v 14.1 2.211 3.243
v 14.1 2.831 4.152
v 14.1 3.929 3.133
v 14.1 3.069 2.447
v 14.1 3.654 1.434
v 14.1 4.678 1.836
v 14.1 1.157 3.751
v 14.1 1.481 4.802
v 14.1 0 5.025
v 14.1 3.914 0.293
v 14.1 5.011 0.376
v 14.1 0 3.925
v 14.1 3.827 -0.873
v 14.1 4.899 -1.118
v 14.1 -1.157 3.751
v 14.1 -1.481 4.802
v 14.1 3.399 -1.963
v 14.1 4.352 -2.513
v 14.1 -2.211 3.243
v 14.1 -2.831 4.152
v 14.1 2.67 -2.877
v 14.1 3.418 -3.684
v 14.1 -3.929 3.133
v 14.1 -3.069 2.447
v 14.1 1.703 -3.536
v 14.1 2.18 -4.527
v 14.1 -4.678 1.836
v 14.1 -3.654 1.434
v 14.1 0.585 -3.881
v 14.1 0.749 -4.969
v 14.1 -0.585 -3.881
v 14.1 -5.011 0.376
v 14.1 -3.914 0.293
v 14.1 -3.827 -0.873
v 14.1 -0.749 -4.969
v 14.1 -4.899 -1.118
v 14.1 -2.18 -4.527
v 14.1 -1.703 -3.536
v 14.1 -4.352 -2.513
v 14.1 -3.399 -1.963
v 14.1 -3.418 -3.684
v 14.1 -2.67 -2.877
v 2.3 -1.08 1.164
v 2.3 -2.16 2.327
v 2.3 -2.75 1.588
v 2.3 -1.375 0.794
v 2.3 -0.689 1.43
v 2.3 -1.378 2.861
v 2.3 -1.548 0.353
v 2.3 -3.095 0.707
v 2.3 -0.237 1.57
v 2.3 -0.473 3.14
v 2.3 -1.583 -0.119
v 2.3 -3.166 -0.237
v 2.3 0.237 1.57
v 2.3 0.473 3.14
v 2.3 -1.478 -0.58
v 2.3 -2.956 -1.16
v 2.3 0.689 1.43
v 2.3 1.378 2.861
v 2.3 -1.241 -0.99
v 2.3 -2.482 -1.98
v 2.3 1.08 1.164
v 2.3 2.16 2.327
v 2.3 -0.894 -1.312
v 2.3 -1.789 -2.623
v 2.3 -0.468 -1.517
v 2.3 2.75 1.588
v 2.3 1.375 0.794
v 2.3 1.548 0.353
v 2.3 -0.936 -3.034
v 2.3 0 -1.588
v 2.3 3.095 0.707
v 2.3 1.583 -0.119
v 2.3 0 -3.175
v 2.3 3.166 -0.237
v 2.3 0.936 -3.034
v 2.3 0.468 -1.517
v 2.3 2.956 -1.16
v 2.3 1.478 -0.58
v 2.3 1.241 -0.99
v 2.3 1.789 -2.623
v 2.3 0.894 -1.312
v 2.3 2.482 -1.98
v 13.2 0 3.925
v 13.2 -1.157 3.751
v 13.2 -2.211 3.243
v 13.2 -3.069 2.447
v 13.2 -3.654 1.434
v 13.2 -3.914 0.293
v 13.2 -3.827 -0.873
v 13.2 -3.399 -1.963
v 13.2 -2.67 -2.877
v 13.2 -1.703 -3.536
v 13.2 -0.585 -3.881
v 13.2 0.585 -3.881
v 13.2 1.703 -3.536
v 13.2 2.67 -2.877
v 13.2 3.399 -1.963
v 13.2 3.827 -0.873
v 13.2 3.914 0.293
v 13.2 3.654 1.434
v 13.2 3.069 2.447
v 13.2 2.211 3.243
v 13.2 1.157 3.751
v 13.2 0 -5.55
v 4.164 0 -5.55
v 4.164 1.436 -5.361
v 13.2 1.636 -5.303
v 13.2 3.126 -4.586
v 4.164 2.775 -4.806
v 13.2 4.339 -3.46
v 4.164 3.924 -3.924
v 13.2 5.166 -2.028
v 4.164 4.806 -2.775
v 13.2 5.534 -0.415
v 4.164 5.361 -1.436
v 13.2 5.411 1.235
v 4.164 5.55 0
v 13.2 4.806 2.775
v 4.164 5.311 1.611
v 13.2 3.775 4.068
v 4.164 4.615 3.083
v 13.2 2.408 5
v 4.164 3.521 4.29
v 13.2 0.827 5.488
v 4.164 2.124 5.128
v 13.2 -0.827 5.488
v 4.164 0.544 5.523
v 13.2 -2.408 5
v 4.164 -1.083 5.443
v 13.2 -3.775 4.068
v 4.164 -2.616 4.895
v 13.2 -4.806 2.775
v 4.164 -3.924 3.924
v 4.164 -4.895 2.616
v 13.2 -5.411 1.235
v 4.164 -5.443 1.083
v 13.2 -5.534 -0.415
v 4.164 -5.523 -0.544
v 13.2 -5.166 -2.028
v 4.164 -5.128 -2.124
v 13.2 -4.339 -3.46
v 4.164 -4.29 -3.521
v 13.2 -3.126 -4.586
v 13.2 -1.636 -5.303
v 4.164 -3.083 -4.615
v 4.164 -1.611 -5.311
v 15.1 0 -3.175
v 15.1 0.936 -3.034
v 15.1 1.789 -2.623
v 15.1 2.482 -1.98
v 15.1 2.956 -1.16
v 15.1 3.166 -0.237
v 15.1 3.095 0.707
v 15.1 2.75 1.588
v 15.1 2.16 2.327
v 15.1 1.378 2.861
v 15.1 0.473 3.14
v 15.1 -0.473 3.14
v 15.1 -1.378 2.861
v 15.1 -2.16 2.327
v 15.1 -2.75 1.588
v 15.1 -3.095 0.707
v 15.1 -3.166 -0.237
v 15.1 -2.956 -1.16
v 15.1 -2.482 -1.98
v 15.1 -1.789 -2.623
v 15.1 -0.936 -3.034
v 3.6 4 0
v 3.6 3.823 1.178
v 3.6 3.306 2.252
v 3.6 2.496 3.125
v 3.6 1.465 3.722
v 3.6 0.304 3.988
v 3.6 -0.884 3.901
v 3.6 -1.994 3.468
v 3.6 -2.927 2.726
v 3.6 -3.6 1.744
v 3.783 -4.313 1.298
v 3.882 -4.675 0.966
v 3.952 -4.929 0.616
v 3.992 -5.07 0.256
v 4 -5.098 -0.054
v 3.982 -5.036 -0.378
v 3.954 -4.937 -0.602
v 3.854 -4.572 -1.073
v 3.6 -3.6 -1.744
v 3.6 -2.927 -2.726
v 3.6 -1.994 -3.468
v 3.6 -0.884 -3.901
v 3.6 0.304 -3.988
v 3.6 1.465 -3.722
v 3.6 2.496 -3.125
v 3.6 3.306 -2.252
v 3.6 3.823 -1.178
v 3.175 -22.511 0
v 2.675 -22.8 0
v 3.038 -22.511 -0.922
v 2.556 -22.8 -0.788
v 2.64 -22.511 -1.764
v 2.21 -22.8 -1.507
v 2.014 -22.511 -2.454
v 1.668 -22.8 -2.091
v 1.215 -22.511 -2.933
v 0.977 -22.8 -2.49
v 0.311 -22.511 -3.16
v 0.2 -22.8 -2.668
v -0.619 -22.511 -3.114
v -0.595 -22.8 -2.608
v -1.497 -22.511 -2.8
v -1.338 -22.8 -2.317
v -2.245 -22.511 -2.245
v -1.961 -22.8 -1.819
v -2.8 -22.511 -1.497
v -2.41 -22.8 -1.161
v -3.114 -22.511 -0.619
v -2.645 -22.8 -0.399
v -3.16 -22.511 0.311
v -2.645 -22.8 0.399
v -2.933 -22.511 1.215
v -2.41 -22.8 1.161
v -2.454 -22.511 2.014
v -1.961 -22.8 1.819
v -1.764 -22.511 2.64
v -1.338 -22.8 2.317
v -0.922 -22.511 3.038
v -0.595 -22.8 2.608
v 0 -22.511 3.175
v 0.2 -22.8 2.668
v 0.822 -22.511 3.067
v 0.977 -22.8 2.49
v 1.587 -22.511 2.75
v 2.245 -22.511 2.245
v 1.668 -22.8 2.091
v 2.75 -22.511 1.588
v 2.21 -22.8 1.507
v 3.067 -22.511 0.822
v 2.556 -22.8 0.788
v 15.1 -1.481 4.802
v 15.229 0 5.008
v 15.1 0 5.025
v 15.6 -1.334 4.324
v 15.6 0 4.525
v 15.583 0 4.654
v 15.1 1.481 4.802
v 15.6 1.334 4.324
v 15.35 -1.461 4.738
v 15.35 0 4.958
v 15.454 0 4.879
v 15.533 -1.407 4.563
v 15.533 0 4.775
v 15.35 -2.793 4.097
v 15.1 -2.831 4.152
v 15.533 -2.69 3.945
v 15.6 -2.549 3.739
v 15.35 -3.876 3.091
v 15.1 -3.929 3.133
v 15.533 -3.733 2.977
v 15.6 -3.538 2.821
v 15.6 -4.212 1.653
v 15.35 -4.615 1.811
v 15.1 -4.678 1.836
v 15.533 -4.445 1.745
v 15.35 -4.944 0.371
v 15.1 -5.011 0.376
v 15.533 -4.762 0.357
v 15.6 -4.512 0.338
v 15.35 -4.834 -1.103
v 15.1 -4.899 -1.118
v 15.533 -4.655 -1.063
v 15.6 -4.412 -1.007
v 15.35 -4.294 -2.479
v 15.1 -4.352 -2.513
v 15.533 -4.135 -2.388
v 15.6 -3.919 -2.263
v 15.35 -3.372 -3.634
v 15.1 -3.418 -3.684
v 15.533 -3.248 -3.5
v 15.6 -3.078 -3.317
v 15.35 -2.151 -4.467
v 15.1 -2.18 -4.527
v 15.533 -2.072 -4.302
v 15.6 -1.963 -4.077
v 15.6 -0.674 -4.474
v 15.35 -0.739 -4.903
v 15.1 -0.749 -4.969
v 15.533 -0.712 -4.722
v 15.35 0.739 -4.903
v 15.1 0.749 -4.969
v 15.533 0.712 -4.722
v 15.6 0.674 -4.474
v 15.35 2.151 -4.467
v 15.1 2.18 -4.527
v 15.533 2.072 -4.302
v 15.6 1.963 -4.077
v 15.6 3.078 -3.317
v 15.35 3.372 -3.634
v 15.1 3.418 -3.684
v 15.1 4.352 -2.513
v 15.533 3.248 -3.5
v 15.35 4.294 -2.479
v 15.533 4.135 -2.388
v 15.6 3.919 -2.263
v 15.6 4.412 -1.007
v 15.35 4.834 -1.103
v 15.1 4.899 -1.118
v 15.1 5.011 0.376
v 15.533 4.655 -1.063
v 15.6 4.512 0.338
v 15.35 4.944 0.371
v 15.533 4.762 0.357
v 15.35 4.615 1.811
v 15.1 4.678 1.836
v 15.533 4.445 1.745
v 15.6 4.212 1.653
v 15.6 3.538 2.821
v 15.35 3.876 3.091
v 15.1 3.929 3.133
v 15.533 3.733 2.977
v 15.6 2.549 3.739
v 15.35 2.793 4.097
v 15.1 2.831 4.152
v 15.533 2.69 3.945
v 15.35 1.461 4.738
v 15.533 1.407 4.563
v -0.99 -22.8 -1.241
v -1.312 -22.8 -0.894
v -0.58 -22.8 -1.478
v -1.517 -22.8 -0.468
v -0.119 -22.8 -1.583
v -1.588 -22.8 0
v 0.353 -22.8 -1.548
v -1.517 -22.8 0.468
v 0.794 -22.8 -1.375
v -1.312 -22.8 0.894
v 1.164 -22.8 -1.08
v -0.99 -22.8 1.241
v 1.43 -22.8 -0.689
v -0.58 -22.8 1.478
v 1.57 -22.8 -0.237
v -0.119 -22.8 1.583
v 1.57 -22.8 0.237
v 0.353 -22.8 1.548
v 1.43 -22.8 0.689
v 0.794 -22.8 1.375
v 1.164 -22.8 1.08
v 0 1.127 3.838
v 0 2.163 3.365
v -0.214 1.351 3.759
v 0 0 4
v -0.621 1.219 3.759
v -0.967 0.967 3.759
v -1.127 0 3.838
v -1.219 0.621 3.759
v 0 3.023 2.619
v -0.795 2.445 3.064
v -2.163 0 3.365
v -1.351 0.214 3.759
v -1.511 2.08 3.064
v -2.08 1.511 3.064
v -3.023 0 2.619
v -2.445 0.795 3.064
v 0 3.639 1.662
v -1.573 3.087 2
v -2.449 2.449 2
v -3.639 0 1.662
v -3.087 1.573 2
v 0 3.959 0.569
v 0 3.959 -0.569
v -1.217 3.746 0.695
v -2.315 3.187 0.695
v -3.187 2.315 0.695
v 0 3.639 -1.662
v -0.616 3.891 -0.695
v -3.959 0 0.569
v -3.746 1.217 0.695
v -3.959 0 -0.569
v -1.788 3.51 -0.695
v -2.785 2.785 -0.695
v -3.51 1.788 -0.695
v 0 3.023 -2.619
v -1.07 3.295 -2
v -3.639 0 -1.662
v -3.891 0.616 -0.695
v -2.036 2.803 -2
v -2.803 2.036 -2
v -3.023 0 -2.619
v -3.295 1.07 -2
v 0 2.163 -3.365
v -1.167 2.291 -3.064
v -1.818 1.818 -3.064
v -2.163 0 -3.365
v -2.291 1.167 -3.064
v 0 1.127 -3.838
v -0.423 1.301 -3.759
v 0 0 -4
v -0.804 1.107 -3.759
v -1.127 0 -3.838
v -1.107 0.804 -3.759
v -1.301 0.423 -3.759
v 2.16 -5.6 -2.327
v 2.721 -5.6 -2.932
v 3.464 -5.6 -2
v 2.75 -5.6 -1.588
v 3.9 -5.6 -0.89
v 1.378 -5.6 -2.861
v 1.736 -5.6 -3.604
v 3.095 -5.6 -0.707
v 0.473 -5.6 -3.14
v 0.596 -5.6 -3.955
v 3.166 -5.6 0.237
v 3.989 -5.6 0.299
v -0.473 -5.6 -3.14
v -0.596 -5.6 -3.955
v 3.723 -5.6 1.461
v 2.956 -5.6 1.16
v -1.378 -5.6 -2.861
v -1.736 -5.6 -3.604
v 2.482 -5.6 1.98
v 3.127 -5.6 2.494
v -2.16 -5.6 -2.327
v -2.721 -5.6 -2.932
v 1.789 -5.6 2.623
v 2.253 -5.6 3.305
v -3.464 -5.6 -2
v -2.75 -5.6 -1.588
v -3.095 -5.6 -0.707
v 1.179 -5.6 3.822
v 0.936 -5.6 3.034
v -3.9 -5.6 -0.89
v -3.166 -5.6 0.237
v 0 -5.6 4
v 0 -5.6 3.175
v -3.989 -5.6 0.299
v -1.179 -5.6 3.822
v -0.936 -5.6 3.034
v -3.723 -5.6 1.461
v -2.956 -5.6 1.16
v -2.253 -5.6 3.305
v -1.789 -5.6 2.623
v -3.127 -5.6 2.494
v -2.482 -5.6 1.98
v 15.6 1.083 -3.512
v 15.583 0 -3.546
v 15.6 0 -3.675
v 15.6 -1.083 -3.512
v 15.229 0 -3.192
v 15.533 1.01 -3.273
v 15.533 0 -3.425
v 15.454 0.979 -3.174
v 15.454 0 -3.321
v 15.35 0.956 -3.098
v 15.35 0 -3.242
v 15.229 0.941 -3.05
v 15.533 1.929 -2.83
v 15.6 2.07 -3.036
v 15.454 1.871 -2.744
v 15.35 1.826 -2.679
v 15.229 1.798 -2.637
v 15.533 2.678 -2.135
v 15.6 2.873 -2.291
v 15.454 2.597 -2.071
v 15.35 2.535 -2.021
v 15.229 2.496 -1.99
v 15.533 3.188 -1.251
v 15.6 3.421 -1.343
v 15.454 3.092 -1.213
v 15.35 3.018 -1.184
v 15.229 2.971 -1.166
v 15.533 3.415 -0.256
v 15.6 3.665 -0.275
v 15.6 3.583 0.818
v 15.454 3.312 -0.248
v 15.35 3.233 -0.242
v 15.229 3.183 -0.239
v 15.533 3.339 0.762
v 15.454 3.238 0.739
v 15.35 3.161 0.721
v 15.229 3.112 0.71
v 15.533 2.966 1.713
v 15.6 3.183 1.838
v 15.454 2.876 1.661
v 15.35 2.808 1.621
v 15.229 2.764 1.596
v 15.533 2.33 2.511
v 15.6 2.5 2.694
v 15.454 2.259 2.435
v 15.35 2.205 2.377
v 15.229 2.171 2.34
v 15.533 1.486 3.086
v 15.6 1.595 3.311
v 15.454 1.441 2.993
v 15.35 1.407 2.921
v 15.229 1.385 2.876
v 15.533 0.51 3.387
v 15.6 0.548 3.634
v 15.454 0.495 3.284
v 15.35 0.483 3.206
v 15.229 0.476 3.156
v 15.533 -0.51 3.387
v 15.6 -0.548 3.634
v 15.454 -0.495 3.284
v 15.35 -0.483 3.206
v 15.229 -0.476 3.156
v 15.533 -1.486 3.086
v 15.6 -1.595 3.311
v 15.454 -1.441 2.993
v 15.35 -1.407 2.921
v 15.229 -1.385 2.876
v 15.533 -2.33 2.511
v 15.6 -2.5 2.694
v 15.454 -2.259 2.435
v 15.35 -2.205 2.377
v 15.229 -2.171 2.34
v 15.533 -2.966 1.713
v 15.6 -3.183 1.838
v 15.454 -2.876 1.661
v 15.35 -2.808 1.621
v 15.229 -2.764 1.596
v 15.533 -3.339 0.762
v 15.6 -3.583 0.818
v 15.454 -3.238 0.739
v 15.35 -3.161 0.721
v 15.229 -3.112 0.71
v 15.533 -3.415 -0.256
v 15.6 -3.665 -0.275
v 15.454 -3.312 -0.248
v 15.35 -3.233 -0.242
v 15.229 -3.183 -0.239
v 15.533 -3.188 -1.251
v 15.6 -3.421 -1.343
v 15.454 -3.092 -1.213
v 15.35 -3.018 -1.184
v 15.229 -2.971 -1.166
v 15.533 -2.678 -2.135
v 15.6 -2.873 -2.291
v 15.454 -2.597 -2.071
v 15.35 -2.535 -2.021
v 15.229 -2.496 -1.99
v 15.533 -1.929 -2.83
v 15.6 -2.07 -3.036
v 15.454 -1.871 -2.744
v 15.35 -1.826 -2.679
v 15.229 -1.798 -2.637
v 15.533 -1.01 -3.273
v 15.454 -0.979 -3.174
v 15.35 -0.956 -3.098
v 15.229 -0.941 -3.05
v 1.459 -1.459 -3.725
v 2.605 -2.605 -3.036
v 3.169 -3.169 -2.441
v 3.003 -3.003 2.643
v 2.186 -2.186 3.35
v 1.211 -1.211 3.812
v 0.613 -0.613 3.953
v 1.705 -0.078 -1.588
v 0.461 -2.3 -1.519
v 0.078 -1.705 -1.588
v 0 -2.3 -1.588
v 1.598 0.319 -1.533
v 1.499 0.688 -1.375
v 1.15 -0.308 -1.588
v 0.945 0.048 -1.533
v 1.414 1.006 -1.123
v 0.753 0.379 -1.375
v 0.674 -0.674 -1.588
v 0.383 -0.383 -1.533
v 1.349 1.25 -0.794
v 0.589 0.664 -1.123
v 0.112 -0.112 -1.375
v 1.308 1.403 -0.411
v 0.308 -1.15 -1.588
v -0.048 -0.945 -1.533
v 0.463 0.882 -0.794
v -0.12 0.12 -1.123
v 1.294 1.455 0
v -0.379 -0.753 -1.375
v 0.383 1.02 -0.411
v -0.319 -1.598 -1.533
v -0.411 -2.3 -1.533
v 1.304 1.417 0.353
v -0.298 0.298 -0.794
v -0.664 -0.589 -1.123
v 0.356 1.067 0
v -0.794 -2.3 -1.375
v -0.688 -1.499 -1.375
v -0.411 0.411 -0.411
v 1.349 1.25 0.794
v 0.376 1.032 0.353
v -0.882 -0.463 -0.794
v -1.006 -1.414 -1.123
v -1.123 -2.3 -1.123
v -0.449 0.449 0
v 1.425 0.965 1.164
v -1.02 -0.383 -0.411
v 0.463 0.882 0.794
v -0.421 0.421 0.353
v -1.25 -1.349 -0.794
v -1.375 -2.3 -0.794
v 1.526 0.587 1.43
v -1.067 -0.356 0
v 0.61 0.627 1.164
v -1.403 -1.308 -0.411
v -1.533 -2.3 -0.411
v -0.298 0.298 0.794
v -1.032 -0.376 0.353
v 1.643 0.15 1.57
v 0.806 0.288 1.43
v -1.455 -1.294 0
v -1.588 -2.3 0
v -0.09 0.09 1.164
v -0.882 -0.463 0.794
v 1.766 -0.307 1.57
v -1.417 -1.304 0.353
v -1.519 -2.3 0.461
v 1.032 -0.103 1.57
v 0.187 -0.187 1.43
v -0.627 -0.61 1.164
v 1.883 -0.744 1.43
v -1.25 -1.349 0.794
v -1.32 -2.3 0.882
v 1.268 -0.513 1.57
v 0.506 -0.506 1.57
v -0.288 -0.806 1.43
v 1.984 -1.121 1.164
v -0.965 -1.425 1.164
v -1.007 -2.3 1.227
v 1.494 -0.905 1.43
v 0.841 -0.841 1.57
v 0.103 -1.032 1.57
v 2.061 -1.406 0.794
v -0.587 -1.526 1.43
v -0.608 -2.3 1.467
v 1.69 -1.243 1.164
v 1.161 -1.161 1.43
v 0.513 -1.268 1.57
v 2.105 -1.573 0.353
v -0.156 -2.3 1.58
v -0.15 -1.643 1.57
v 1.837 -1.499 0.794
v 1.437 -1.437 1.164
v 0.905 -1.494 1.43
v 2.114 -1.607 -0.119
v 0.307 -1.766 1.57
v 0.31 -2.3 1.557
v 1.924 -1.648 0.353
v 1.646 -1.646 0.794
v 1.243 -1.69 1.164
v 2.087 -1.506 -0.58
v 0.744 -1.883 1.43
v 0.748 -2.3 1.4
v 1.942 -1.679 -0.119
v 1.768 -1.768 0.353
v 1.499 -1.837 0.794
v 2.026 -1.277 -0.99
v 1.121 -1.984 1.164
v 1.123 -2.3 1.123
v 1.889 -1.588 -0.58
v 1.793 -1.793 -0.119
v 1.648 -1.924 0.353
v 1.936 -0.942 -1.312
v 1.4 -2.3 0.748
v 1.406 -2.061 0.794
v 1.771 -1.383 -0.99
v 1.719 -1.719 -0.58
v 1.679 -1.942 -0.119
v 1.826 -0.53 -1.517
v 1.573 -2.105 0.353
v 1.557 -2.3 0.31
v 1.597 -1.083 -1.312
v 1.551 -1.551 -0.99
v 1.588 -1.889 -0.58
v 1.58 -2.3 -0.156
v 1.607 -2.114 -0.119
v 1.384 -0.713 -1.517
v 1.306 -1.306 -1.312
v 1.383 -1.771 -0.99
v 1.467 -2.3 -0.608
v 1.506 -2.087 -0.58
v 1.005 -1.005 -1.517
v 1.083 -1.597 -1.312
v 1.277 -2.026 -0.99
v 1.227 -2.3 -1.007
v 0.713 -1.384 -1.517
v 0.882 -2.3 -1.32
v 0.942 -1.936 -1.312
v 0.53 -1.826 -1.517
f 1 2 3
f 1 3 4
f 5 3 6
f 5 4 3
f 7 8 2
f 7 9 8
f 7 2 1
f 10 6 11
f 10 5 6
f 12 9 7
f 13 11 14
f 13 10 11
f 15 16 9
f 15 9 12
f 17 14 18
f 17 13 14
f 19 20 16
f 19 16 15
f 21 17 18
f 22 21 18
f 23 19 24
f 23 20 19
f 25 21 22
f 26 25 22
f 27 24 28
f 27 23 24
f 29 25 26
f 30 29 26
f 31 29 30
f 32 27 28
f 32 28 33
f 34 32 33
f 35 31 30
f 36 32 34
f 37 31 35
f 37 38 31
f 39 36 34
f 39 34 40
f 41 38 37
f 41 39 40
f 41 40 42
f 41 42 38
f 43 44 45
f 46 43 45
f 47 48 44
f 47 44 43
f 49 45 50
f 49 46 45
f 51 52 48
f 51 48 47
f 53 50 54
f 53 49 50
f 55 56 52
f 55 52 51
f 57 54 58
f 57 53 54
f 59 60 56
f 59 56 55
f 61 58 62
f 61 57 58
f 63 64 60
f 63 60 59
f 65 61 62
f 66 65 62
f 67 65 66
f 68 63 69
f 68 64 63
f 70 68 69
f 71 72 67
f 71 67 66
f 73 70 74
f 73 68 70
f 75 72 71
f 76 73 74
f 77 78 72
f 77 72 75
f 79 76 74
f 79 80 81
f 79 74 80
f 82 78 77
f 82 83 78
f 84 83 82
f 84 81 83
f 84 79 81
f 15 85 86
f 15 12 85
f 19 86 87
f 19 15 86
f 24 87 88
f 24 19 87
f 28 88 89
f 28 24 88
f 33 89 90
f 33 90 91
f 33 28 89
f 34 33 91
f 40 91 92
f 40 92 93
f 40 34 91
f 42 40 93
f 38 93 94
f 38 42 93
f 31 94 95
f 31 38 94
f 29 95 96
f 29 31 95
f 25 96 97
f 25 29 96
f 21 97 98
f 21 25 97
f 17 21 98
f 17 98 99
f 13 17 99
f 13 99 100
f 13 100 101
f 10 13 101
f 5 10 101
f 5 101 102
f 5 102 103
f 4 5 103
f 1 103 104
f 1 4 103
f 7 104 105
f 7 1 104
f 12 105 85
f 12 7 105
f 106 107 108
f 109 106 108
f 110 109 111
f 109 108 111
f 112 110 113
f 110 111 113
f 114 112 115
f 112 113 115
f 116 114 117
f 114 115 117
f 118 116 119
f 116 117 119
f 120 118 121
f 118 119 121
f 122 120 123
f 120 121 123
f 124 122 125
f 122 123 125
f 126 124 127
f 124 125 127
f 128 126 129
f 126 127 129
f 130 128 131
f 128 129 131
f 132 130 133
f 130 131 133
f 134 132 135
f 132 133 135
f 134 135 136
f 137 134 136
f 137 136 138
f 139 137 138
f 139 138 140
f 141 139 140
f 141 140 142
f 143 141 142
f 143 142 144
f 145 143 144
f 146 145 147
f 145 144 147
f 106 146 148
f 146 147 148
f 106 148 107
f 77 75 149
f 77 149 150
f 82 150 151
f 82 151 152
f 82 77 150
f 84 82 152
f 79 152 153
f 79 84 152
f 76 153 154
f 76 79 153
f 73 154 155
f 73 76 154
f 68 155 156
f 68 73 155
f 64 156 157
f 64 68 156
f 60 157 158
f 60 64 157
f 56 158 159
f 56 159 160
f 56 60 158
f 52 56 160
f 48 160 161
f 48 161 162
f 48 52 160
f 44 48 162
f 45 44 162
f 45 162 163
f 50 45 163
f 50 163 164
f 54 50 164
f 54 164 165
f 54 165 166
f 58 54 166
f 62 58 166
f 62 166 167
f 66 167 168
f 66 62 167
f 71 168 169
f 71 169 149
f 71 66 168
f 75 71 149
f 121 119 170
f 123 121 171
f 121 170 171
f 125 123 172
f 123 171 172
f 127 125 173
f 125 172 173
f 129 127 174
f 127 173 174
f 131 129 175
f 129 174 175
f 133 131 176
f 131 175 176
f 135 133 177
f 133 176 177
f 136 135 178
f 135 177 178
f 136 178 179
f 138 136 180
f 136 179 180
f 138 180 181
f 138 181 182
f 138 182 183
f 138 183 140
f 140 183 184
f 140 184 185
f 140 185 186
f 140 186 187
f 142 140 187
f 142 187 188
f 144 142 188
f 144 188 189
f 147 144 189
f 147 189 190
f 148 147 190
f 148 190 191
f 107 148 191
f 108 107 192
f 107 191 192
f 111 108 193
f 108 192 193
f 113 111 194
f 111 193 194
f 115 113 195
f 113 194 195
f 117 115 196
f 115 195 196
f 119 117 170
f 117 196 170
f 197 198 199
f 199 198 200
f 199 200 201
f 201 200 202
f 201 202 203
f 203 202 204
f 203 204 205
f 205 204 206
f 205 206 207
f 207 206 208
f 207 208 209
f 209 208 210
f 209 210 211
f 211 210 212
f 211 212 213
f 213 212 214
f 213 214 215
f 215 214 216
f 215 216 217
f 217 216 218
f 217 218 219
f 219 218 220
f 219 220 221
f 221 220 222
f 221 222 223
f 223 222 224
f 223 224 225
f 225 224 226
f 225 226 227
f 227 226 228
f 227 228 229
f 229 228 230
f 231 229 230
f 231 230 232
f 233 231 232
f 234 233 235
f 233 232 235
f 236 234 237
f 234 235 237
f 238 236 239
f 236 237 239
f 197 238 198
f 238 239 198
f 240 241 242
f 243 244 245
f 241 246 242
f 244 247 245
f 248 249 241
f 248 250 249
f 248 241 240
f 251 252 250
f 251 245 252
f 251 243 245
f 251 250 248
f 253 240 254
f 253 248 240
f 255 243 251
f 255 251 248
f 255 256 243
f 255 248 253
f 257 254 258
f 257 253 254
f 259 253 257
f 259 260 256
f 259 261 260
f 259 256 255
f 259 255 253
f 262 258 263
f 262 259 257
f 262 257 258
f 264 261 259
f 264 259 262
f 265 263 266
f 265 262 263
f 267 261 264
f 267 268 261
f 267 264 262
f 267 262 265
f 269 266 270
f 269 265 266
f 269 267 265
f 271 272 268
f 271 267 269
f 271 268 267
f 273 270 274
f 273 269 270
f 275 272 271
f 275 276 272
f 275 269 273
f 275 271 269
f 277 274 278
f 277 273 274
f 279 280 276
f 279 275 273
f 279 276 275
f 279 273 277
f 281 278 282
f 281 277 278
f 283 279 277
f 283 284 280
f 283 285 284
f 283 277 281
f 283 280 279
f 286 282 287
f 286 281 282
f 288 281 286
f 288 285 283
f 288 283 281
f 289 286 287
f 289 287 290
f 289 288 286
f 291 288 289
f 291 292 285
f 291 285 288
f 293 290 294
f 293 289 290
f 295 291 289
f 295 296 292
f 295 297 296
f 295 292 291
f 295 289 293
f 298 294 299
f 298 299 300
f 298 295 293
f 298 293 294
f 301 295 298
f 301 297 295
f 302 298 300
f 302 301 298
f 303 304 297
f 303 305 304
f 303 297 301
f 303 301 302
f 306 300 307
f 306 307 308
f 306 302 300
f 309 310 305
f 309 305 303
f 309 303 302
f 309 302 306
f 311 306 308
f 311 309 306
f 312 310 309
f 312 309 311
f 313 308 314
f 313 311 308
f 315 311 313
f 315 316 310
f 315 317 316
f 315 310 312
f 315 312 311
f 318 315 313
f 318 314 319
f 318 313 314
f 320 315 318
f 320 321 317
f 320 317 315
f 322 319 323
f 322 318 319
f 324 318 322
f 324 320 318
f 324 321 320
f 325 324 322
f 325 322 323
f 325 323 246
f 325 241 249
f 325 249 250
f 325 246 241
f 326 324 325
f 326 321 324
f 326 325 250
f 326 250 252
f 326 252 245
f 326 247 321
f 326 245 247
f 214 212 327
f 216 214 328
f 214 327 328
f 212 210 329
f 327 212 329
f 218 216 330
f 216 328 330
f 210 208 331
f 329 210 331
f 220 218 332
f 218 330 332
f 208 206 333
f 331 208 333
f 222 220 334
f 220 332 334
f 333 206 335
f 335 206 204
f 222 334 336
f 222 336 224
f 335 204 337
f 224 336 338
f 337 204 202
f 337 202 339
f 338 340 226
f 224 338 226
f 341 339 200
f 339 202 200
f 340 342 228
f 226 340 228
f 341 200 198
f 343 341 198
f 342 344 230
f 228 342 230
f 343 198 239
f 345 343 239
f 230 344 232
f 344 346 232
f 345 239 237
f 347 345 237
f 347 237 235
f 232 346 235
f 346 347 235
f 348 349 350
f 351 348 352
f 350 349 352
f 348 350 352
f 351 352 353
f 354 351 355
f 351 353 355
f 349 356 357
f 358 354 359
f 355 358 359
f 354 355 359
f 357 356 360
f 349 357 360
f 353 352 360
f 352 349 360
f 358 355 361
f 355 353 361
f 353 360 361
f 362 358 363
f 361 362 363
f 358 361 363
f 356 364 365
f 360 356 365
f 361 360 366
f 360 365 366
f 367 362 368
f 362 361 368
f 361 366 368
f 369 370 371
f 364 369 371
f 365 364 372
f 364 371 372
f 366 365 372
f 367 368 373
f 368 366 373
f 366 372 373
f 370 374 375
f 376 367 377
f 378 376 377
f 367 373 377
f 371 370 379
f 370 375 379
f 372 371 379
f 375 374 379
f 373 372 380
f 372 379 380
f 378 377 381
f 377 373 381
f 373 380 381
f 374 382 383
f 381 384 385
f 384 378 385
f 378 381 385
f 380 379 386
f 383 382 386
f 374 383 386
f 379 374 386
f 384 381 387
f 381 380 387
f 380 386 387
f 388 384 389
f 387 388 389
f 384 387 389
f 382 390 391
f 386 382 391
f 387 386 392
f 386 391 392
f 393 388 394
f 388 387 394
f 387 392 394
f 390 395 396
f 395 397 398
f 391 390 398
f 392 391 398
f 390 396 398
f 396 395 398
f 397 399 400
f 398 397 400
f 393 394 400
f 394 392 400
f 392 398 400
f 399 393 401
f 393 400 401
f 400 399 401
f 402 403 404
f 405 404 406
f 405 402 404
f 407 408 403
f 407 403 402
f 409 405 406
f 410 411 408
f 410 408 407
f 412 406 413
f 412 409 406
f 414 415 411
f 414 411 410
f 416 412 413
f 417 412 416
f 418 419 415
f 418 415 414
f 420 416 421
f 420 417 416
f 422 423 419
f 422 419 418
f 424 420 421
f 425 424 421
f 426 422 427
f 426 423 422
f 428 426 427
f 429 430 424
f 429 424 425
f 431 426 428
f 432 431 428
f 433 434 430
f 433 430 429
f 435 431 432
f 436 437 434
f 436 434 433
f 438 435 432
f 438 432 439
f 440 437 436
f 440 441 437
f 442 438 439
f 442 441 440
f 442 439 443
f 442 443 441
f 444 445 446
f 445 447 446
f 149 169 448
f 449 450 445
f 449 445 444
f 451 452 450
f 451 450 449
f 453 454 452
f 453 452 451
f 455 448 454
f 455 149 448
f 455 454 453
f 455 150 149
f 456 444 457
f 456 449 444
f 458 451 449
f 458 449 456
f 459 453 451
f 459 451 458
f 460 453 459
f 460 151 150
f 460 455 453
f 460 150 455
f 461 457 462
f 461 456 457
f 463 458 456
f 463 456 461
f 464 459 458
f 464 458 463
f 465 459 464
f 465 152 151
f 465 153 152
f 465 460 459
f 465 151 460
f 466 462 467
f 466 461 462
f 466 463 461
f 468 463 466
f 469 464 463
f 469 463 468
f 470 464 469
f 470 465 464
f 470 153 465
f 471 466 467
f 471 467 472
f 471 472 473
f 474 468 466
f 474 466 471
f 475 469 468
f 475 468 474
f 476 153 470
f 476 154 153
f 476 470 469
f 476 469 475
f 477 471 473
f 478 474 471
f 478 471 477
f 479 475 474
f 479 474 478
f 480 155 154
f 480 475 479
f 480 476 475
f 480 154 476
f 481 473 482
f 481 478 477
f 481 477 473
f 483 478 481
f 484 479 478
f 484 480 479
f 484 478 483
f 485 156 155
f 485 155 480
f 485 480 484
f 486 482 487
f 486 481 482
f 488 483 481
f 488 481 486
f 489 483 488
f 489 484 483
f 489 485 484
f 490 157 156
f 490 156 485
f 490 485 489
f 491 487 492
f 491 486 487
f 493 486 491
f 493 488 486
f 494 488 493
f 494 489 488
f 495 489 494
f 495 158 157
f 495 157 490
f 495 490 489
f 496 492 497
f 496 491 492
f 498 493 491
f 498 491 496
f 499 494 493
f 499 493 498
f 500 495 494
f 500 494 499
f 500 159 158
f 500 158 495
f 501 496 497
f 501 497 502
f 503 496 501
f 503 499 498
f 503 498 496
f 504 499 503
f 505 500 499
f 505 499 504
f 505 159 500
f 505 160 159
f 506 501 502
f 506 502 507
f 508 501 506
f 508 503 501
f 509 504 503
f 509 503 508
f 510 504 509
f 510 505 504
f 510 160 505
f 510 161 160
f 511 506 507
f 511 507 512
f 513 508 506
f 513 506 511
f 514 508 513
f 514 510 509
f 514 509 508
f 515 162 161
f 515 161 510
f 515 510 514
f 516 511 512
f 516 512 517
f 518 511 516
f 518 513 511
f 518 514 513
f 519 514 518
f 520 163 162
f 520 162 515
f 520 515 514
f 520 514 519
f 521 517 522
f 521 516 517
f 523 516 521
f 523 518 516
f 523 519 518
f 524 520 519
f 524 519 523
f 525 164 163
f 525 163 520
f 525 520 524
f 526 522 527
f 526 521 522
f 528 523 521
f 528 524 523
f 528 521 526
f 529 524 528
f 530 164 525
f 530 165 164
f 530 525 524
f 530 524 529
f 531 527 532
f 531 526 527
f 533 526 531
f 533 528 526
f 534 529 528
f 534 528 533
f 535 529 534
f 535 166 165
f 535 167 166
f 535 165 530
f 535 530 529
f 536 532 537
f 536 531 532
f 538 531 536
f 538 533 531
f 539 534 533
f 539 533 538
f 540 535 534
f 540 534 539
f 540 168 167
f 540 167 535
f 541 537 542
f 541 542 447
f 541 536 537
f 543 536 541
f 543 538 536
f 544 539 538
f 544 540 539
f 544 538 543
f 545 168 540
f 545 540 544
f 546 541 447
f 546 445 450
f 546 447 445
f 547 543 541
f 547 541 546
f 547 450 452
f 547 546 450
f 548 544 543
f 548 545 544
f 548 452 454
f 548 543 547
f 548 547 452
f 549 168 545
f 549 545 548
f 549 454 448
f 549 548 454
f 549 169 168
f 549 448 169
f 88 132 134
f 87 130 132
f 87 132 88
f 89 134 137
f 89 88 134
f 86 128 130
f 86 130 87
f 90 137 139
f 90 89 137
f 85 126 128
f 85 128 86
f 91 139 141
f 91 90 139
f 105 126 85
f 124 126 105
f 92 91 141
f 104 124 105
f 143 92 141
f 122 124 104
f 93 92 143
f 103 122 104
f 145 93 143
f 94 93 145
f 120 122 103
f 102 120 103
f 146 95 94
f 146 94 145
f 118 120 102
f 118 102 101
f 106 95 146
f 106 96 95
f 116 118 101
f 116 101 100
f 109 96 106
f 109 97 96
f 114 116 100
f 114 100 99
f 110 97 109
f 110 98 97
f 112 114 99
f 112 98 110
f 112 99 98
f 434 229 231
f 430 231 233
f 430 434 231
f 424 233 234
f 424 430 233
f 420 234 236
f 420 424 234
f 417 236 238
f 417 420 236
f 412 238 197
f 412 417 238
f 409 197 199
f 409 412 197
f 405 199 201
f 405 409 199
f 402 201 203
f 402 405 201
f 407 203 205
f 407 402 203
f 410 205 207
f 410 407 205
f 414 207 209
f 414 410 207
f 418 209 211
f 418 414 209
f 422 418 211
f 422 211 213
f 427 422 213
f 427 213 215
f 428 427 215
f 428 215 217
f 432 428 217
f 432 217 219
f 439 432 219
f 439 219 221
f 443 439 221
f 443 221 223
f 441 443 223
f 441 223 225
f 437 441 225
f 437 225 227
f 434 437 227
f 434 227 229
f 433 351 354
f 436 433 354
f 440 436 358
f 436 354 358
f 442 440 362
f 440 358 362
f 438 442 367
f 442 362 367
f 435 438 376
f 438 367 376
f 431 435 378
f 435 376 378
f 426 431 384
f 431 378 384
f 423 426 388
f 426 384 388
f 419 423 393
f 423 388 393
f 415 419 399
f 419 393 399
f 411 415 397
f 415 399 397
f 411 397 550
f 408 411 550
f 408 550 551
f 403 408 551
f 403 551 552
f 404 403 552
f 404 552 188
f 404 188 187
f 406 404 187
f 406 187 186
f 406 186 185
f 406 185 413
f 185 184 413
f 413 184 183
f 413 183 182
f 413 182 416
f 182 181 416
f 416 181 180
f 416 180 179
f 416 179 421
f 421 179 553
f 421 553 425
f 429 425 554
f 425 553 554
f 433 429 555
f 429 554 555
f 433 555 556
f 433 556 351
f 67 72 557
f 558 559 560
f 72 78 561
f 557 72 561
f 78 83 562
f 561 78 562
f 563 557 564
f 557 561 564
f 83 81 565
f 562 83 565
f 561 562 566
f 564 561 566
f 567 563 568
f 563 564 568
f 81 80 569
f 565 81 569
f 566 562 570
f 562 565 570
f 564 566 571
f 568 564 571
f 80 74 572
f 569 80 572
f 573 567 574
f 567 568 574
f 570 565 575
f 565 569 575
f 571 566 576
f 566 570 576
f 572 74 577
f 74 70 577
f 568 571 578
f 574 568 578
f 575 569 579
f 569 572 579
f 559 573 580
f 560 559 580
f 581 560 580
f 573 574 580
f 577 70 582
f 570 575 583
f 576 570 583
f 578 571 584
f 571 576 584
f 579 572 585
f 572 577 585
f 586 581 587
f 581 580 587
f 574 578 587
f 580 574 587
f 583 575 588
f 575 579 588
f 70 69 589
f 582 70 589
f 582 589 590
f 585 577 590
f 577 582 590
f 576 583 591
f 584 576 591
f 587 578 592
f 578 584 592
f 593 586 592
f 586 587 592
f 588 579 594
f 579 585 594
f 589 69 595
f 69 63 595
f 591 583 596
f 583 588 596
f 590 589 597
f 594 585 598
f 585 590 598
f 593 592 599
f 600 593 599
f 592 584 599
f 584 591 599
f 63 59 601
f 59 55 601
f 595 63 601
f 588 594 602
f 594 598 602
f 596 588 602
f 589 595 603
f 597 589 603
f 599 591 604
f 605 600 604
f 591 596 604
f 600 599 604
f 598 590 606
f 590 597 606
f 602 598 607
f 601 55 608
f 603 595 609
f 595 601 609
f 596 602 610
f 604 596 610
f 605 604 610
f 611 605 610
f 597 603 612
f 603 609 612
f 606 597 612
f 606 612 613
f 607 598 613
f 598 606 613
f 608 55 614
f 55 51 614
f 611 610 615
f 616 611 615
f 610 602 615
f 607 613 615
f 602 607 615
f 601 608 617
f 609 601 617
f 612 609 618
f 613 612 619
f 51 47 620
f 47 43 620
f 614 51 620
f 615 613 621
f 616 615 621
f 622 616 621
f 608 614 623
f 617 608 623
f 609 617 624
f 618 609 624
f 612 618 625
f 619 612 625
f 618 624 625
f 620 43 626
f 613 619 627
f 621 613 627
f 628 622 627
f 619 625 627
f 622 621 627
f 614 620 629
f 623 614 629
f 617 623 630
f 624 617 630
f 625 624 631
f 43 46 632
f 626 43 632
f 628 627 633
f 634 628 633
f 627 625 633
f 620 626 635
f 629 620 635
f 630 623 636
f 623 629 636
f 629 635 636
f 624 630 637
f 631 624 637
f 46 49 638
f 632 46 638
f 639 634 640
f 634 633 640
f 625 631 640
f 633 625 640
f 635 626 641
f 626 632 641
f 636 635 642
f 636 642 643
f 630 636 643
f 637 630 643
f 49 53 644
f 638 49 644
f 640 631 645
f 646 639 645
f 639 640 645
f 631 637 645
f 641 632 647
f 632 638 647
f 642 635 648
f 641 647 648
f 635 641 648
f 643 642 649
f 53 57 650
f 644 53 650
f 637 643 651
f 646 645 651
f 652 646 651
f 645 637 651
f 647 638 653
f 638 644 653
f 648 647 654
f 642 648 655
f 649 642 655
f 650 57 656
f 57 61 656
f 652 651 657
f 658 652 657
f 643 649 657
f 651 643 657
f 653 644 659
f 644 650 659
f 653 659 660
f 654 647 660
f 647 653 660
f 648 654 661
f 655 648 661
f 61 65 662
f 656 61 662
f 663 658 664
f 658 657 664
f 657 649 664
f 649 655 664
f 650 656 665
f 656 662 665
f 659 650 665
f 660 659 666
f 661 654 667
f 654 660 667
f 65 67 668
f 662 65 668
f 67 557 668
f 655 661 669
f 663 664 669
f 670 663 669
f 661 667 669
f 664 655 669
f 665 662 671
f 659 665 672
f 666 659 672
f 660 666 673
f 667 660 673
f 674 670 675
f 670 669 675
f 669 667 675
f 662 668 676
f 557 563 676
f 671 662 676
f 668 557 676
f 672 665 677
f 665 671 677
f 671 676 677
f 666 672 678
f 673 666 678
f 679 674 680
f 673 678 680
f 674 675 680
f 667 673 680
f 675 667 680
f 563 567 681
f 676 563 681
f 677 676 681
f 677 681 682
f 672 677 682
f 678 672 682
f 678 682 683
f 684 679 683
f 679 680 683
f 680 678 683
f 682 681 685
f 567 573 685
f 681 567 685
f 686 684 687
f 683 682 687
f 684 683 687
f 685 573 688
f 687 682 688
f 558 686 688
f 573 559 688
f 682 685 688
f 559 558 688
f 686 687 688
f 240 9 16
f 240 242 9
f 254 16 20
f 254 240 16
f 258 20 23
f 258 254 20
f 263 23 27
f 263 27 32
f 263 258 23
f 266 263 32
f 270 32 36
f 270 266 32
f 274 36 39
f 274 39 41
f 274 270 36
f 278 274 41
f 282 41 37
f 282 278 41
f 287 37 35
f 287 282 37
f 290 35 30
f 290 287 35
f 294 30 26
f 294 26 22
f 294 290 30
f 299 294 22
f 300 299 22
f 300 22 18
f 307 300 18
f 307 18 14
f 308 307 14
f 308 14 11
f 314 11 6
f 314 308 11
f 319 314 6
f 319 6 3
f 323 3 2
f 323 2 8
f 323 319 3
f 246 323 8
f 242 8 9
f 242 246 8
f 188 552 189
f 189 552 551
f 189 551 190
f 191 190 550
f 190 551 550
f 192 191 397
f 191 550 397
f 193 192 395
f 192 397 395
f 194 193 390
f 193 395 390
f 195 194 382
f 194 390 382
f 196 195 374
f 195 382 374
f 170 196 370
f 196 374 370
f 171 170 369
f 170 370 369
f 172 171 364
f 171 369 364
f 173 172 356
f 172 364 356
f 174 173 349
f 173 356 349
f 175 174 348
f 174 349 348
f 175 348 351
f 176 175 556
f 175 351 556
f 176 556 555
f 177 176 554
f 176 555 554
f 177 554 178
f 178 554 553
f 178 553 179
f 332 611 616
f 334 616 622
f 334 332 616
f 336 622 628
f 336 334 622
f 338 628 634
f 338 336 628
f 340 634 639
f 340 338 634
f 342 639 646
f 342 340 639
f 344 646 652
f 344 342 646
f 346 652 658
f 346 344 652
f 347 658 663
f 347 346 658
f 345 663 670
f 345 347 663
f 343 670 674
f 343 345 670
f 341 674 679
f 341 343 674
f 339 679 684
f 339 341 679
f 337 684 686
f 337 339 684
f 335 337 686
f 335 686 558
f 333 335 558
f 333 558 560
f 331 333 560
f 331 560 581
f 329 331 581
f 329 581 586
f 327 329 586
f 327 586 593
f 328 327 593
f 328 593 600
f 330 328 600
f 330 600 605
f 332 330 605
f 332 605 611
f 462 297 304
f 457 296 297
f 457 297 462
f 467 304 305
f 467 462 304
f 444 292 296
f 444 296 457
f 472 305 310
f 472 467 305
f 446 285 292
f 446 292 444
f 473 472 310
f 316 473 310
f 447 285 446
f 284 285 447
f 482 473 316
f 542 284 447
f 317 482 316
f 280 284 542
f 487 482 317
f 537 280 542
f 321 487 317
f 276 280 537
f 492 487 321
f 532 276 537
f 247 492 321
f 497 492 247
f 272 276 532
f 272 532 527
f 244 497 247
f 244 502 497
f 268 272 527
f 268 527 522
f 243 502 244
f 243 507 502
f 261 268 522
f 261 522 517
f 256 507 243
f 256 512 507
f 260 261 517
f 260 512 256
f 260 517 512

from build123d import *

# Parameters (mm, degrees)
SKETCH1_R             = 4
BASE_EXTRUDE_DEPTH    = 3.6
RBODY_SKETCH_R        = 5.55
RBODY_DEPTH           = 9.6
ELBOW_ANGLE           = 90
SKETCH3_R             = 4
BOSS_EXTRUDE1_DEPTH   = 5.6
STEM_SKETCH_R         = 3.175
STEM_DEPTH            = 17.2
RTUBE_START           = -13.3
RTUBE_SKETCH_R        = 3.175
RTUBE_DEPTH           = 13.3
RTUBE_RADIUS_R        = 0.5
DIAMETER_R            = 1.5875
PORT_THREADS_REACH    = 34.831
PORT_THREADS_SKETCH_R = 1.5875


with BuildPart() as part:
    # Sketch1 → Base-Extrude (new body)
    with BuildSketch(Plane(origin=(0, 0, 0), x_dir=(0, 0, -1), z_dir=(1, 0, 0))):
        with Locations(Location((0, 0, 0), (0, 0, 180))):
            Circle(SKETCH1_R)
    extrude(amount=BASE_EXTRUDE_DEPTH)

    # RBody_Sketch → RBody (add)
    with BuildSketch(Plane(origin=(3.6, 0, 0), x_dir=(0, 0, -1), z_dir=(1, 0, 0))):
        Circle(RBODY_SKETCH_R)
    extrude(amount=RBODY_DEPTH)

    # RBody_Chamfer: read off the stored shape, not the designer's step
    # RBody_Chamfer outline → RBody_Chamfer (revolve, cut)
    with BuildSketch(Plane.YX):
        Polygon((5.55, 4.164153863), (4, 3.6), (5.55, 3.6), align=None)
    revolve(axis=Axis((0, 0, 0), (1, 0, 0)), mode=Mode.SUBTRACT)

    # RRelease_Sketch → RRelease (revolve)
    with BuildSketch(Plane.XY, mode=Mode.PRIVATE) as rrelease_sk:
        with BuildLine():
            Line((13.2, 3.925), (14.1, 3.925))
            Line((14.1, 3.925), (14.1, 5.025))
            Line((14.1, 5.025), (15.1, 5.025))
            ThreePointArc((15.1, 5.025), (15.453553391, 4.878553391), (15.6, 4.525))
            Line((15.6, 4.525), (15.6, 0))
            Line((15.6, 0), (13.2, 0))
            Line((13.2, 0), (13.2, 3.925))
        make_face()
    revolve(rrelease_sk.sketch.rotate(Axis((12.597722381, 0, 0), (1, 0, 0)), 90), axis=Axis((12.597722381, 0, 0), (1, 0, 0)))

    # Elbow_Sketch → Elbow (revolve)
    with BuildSketch(Plane.ZY):
        with BuildLine():
            Line((-4, 0), (4, 0))
            ThreePointArc((4, 0), (0, 4), (-4, 0))
        make_face()
    revolve(axis=Axis((0, 0, -6.487672297), (0, 0, 1)), revolution_arc=ELBOW_ANGLE)

    # Sketch3 → Boss-Extrude1 (add)
    with BuildSketch(Plane.XZ):
        with Locations(Location((0, 0, 0), (0, 0, 90))):
            Circle(SKETCH3_R)
    extrude(amount=BOSS_EXTRUDE1_DEPTH)

    # Stem_Sketch → Stem (add)
    with BuildSketch(Plane(origin=(0, -5.6, 0), x_dir=(-1, 0, 0), z_dir=(0, 1, 0))):
        with Locations(Location((0, 0, 0), (0, 0, 90))):
            Circle(STEM_SKETCH_R)
    extrude(amount=-STEM_DEPTH)

    # RTube_Sketch → RTube (cut)
    with BuildSketch(Plane(origin=(15.6, 0, 0), x_dir=(0, 0, -1), z_dir=(1, 0, 0)).offset(RTUBE_START)):
        Circle(RTUBE_SKETCH_R)
    extrude(amount=RTUBE_DEPTH, mode=Mode.SUBTRACT)

    # RTube_Radius
    rtube_radius_edges = [part.edges().sort_by_distance(p)[0] for p in [
        (15.6, 0, 3.175),
    ]]
    fillet(rtube_radius_edges, radius=RTUBE_RADIUS_R)

    # Stem_Chamfer: read off the stored shape, not the designer's step
    # Stem_Chamfer outline → Stem_Chamfer (revolve, cut)
    with BuildSketch(Plane.XY):
        Polygon((3.175, -22.511324865), (2.675, -22.8), (3.175, -22.8), align=None)
    revolve(axis=Axis((0, 0, 0), (0, 1, 0)), mode=Mode.SUBTRACT)

    # Port_Curve: sweep along a path in Profile
    with BuildLine(Plane.XY) as port_curve_path:
        ThreePointArc((2.3, 0), (0.673654403, -0.673654403), (0, -2.3))
    # Diameter → Port_Curve (sweep, cut)
    with BuildSketch(Plane(origin=(2.3, 0, 0), x_dir=(0, 0, -1), z_dir=(1, 0, 0))):
        Circle(DIAMETER_R)
    sweep(path=port_curve_path.line, mode=Mode.SUBTRACT)

    # Port_Threads_Sketch → Port_Threads (cut, up to next)
    with BuildSketch(Plane(origin=(0, -22.8, 0), x_dir=(-1, 0, 0), z_dir=(0, 1, 0)), mode=Mode.PRIVATE) as port_threads_sk1:
        Circle(PORT_THREADS_SKETCH_R)
    port_threads_tool1 = extrude(port_threads_sk1.sketch, amount=PORT_THREADS_REACH, mode=Mode.PRIVATE) & part.part
    add(port_threads_tool1.solids().sort_by_distance((0, -22.8, 0))[0], mode=Mode.SUBTRACT)


solid = part.part
